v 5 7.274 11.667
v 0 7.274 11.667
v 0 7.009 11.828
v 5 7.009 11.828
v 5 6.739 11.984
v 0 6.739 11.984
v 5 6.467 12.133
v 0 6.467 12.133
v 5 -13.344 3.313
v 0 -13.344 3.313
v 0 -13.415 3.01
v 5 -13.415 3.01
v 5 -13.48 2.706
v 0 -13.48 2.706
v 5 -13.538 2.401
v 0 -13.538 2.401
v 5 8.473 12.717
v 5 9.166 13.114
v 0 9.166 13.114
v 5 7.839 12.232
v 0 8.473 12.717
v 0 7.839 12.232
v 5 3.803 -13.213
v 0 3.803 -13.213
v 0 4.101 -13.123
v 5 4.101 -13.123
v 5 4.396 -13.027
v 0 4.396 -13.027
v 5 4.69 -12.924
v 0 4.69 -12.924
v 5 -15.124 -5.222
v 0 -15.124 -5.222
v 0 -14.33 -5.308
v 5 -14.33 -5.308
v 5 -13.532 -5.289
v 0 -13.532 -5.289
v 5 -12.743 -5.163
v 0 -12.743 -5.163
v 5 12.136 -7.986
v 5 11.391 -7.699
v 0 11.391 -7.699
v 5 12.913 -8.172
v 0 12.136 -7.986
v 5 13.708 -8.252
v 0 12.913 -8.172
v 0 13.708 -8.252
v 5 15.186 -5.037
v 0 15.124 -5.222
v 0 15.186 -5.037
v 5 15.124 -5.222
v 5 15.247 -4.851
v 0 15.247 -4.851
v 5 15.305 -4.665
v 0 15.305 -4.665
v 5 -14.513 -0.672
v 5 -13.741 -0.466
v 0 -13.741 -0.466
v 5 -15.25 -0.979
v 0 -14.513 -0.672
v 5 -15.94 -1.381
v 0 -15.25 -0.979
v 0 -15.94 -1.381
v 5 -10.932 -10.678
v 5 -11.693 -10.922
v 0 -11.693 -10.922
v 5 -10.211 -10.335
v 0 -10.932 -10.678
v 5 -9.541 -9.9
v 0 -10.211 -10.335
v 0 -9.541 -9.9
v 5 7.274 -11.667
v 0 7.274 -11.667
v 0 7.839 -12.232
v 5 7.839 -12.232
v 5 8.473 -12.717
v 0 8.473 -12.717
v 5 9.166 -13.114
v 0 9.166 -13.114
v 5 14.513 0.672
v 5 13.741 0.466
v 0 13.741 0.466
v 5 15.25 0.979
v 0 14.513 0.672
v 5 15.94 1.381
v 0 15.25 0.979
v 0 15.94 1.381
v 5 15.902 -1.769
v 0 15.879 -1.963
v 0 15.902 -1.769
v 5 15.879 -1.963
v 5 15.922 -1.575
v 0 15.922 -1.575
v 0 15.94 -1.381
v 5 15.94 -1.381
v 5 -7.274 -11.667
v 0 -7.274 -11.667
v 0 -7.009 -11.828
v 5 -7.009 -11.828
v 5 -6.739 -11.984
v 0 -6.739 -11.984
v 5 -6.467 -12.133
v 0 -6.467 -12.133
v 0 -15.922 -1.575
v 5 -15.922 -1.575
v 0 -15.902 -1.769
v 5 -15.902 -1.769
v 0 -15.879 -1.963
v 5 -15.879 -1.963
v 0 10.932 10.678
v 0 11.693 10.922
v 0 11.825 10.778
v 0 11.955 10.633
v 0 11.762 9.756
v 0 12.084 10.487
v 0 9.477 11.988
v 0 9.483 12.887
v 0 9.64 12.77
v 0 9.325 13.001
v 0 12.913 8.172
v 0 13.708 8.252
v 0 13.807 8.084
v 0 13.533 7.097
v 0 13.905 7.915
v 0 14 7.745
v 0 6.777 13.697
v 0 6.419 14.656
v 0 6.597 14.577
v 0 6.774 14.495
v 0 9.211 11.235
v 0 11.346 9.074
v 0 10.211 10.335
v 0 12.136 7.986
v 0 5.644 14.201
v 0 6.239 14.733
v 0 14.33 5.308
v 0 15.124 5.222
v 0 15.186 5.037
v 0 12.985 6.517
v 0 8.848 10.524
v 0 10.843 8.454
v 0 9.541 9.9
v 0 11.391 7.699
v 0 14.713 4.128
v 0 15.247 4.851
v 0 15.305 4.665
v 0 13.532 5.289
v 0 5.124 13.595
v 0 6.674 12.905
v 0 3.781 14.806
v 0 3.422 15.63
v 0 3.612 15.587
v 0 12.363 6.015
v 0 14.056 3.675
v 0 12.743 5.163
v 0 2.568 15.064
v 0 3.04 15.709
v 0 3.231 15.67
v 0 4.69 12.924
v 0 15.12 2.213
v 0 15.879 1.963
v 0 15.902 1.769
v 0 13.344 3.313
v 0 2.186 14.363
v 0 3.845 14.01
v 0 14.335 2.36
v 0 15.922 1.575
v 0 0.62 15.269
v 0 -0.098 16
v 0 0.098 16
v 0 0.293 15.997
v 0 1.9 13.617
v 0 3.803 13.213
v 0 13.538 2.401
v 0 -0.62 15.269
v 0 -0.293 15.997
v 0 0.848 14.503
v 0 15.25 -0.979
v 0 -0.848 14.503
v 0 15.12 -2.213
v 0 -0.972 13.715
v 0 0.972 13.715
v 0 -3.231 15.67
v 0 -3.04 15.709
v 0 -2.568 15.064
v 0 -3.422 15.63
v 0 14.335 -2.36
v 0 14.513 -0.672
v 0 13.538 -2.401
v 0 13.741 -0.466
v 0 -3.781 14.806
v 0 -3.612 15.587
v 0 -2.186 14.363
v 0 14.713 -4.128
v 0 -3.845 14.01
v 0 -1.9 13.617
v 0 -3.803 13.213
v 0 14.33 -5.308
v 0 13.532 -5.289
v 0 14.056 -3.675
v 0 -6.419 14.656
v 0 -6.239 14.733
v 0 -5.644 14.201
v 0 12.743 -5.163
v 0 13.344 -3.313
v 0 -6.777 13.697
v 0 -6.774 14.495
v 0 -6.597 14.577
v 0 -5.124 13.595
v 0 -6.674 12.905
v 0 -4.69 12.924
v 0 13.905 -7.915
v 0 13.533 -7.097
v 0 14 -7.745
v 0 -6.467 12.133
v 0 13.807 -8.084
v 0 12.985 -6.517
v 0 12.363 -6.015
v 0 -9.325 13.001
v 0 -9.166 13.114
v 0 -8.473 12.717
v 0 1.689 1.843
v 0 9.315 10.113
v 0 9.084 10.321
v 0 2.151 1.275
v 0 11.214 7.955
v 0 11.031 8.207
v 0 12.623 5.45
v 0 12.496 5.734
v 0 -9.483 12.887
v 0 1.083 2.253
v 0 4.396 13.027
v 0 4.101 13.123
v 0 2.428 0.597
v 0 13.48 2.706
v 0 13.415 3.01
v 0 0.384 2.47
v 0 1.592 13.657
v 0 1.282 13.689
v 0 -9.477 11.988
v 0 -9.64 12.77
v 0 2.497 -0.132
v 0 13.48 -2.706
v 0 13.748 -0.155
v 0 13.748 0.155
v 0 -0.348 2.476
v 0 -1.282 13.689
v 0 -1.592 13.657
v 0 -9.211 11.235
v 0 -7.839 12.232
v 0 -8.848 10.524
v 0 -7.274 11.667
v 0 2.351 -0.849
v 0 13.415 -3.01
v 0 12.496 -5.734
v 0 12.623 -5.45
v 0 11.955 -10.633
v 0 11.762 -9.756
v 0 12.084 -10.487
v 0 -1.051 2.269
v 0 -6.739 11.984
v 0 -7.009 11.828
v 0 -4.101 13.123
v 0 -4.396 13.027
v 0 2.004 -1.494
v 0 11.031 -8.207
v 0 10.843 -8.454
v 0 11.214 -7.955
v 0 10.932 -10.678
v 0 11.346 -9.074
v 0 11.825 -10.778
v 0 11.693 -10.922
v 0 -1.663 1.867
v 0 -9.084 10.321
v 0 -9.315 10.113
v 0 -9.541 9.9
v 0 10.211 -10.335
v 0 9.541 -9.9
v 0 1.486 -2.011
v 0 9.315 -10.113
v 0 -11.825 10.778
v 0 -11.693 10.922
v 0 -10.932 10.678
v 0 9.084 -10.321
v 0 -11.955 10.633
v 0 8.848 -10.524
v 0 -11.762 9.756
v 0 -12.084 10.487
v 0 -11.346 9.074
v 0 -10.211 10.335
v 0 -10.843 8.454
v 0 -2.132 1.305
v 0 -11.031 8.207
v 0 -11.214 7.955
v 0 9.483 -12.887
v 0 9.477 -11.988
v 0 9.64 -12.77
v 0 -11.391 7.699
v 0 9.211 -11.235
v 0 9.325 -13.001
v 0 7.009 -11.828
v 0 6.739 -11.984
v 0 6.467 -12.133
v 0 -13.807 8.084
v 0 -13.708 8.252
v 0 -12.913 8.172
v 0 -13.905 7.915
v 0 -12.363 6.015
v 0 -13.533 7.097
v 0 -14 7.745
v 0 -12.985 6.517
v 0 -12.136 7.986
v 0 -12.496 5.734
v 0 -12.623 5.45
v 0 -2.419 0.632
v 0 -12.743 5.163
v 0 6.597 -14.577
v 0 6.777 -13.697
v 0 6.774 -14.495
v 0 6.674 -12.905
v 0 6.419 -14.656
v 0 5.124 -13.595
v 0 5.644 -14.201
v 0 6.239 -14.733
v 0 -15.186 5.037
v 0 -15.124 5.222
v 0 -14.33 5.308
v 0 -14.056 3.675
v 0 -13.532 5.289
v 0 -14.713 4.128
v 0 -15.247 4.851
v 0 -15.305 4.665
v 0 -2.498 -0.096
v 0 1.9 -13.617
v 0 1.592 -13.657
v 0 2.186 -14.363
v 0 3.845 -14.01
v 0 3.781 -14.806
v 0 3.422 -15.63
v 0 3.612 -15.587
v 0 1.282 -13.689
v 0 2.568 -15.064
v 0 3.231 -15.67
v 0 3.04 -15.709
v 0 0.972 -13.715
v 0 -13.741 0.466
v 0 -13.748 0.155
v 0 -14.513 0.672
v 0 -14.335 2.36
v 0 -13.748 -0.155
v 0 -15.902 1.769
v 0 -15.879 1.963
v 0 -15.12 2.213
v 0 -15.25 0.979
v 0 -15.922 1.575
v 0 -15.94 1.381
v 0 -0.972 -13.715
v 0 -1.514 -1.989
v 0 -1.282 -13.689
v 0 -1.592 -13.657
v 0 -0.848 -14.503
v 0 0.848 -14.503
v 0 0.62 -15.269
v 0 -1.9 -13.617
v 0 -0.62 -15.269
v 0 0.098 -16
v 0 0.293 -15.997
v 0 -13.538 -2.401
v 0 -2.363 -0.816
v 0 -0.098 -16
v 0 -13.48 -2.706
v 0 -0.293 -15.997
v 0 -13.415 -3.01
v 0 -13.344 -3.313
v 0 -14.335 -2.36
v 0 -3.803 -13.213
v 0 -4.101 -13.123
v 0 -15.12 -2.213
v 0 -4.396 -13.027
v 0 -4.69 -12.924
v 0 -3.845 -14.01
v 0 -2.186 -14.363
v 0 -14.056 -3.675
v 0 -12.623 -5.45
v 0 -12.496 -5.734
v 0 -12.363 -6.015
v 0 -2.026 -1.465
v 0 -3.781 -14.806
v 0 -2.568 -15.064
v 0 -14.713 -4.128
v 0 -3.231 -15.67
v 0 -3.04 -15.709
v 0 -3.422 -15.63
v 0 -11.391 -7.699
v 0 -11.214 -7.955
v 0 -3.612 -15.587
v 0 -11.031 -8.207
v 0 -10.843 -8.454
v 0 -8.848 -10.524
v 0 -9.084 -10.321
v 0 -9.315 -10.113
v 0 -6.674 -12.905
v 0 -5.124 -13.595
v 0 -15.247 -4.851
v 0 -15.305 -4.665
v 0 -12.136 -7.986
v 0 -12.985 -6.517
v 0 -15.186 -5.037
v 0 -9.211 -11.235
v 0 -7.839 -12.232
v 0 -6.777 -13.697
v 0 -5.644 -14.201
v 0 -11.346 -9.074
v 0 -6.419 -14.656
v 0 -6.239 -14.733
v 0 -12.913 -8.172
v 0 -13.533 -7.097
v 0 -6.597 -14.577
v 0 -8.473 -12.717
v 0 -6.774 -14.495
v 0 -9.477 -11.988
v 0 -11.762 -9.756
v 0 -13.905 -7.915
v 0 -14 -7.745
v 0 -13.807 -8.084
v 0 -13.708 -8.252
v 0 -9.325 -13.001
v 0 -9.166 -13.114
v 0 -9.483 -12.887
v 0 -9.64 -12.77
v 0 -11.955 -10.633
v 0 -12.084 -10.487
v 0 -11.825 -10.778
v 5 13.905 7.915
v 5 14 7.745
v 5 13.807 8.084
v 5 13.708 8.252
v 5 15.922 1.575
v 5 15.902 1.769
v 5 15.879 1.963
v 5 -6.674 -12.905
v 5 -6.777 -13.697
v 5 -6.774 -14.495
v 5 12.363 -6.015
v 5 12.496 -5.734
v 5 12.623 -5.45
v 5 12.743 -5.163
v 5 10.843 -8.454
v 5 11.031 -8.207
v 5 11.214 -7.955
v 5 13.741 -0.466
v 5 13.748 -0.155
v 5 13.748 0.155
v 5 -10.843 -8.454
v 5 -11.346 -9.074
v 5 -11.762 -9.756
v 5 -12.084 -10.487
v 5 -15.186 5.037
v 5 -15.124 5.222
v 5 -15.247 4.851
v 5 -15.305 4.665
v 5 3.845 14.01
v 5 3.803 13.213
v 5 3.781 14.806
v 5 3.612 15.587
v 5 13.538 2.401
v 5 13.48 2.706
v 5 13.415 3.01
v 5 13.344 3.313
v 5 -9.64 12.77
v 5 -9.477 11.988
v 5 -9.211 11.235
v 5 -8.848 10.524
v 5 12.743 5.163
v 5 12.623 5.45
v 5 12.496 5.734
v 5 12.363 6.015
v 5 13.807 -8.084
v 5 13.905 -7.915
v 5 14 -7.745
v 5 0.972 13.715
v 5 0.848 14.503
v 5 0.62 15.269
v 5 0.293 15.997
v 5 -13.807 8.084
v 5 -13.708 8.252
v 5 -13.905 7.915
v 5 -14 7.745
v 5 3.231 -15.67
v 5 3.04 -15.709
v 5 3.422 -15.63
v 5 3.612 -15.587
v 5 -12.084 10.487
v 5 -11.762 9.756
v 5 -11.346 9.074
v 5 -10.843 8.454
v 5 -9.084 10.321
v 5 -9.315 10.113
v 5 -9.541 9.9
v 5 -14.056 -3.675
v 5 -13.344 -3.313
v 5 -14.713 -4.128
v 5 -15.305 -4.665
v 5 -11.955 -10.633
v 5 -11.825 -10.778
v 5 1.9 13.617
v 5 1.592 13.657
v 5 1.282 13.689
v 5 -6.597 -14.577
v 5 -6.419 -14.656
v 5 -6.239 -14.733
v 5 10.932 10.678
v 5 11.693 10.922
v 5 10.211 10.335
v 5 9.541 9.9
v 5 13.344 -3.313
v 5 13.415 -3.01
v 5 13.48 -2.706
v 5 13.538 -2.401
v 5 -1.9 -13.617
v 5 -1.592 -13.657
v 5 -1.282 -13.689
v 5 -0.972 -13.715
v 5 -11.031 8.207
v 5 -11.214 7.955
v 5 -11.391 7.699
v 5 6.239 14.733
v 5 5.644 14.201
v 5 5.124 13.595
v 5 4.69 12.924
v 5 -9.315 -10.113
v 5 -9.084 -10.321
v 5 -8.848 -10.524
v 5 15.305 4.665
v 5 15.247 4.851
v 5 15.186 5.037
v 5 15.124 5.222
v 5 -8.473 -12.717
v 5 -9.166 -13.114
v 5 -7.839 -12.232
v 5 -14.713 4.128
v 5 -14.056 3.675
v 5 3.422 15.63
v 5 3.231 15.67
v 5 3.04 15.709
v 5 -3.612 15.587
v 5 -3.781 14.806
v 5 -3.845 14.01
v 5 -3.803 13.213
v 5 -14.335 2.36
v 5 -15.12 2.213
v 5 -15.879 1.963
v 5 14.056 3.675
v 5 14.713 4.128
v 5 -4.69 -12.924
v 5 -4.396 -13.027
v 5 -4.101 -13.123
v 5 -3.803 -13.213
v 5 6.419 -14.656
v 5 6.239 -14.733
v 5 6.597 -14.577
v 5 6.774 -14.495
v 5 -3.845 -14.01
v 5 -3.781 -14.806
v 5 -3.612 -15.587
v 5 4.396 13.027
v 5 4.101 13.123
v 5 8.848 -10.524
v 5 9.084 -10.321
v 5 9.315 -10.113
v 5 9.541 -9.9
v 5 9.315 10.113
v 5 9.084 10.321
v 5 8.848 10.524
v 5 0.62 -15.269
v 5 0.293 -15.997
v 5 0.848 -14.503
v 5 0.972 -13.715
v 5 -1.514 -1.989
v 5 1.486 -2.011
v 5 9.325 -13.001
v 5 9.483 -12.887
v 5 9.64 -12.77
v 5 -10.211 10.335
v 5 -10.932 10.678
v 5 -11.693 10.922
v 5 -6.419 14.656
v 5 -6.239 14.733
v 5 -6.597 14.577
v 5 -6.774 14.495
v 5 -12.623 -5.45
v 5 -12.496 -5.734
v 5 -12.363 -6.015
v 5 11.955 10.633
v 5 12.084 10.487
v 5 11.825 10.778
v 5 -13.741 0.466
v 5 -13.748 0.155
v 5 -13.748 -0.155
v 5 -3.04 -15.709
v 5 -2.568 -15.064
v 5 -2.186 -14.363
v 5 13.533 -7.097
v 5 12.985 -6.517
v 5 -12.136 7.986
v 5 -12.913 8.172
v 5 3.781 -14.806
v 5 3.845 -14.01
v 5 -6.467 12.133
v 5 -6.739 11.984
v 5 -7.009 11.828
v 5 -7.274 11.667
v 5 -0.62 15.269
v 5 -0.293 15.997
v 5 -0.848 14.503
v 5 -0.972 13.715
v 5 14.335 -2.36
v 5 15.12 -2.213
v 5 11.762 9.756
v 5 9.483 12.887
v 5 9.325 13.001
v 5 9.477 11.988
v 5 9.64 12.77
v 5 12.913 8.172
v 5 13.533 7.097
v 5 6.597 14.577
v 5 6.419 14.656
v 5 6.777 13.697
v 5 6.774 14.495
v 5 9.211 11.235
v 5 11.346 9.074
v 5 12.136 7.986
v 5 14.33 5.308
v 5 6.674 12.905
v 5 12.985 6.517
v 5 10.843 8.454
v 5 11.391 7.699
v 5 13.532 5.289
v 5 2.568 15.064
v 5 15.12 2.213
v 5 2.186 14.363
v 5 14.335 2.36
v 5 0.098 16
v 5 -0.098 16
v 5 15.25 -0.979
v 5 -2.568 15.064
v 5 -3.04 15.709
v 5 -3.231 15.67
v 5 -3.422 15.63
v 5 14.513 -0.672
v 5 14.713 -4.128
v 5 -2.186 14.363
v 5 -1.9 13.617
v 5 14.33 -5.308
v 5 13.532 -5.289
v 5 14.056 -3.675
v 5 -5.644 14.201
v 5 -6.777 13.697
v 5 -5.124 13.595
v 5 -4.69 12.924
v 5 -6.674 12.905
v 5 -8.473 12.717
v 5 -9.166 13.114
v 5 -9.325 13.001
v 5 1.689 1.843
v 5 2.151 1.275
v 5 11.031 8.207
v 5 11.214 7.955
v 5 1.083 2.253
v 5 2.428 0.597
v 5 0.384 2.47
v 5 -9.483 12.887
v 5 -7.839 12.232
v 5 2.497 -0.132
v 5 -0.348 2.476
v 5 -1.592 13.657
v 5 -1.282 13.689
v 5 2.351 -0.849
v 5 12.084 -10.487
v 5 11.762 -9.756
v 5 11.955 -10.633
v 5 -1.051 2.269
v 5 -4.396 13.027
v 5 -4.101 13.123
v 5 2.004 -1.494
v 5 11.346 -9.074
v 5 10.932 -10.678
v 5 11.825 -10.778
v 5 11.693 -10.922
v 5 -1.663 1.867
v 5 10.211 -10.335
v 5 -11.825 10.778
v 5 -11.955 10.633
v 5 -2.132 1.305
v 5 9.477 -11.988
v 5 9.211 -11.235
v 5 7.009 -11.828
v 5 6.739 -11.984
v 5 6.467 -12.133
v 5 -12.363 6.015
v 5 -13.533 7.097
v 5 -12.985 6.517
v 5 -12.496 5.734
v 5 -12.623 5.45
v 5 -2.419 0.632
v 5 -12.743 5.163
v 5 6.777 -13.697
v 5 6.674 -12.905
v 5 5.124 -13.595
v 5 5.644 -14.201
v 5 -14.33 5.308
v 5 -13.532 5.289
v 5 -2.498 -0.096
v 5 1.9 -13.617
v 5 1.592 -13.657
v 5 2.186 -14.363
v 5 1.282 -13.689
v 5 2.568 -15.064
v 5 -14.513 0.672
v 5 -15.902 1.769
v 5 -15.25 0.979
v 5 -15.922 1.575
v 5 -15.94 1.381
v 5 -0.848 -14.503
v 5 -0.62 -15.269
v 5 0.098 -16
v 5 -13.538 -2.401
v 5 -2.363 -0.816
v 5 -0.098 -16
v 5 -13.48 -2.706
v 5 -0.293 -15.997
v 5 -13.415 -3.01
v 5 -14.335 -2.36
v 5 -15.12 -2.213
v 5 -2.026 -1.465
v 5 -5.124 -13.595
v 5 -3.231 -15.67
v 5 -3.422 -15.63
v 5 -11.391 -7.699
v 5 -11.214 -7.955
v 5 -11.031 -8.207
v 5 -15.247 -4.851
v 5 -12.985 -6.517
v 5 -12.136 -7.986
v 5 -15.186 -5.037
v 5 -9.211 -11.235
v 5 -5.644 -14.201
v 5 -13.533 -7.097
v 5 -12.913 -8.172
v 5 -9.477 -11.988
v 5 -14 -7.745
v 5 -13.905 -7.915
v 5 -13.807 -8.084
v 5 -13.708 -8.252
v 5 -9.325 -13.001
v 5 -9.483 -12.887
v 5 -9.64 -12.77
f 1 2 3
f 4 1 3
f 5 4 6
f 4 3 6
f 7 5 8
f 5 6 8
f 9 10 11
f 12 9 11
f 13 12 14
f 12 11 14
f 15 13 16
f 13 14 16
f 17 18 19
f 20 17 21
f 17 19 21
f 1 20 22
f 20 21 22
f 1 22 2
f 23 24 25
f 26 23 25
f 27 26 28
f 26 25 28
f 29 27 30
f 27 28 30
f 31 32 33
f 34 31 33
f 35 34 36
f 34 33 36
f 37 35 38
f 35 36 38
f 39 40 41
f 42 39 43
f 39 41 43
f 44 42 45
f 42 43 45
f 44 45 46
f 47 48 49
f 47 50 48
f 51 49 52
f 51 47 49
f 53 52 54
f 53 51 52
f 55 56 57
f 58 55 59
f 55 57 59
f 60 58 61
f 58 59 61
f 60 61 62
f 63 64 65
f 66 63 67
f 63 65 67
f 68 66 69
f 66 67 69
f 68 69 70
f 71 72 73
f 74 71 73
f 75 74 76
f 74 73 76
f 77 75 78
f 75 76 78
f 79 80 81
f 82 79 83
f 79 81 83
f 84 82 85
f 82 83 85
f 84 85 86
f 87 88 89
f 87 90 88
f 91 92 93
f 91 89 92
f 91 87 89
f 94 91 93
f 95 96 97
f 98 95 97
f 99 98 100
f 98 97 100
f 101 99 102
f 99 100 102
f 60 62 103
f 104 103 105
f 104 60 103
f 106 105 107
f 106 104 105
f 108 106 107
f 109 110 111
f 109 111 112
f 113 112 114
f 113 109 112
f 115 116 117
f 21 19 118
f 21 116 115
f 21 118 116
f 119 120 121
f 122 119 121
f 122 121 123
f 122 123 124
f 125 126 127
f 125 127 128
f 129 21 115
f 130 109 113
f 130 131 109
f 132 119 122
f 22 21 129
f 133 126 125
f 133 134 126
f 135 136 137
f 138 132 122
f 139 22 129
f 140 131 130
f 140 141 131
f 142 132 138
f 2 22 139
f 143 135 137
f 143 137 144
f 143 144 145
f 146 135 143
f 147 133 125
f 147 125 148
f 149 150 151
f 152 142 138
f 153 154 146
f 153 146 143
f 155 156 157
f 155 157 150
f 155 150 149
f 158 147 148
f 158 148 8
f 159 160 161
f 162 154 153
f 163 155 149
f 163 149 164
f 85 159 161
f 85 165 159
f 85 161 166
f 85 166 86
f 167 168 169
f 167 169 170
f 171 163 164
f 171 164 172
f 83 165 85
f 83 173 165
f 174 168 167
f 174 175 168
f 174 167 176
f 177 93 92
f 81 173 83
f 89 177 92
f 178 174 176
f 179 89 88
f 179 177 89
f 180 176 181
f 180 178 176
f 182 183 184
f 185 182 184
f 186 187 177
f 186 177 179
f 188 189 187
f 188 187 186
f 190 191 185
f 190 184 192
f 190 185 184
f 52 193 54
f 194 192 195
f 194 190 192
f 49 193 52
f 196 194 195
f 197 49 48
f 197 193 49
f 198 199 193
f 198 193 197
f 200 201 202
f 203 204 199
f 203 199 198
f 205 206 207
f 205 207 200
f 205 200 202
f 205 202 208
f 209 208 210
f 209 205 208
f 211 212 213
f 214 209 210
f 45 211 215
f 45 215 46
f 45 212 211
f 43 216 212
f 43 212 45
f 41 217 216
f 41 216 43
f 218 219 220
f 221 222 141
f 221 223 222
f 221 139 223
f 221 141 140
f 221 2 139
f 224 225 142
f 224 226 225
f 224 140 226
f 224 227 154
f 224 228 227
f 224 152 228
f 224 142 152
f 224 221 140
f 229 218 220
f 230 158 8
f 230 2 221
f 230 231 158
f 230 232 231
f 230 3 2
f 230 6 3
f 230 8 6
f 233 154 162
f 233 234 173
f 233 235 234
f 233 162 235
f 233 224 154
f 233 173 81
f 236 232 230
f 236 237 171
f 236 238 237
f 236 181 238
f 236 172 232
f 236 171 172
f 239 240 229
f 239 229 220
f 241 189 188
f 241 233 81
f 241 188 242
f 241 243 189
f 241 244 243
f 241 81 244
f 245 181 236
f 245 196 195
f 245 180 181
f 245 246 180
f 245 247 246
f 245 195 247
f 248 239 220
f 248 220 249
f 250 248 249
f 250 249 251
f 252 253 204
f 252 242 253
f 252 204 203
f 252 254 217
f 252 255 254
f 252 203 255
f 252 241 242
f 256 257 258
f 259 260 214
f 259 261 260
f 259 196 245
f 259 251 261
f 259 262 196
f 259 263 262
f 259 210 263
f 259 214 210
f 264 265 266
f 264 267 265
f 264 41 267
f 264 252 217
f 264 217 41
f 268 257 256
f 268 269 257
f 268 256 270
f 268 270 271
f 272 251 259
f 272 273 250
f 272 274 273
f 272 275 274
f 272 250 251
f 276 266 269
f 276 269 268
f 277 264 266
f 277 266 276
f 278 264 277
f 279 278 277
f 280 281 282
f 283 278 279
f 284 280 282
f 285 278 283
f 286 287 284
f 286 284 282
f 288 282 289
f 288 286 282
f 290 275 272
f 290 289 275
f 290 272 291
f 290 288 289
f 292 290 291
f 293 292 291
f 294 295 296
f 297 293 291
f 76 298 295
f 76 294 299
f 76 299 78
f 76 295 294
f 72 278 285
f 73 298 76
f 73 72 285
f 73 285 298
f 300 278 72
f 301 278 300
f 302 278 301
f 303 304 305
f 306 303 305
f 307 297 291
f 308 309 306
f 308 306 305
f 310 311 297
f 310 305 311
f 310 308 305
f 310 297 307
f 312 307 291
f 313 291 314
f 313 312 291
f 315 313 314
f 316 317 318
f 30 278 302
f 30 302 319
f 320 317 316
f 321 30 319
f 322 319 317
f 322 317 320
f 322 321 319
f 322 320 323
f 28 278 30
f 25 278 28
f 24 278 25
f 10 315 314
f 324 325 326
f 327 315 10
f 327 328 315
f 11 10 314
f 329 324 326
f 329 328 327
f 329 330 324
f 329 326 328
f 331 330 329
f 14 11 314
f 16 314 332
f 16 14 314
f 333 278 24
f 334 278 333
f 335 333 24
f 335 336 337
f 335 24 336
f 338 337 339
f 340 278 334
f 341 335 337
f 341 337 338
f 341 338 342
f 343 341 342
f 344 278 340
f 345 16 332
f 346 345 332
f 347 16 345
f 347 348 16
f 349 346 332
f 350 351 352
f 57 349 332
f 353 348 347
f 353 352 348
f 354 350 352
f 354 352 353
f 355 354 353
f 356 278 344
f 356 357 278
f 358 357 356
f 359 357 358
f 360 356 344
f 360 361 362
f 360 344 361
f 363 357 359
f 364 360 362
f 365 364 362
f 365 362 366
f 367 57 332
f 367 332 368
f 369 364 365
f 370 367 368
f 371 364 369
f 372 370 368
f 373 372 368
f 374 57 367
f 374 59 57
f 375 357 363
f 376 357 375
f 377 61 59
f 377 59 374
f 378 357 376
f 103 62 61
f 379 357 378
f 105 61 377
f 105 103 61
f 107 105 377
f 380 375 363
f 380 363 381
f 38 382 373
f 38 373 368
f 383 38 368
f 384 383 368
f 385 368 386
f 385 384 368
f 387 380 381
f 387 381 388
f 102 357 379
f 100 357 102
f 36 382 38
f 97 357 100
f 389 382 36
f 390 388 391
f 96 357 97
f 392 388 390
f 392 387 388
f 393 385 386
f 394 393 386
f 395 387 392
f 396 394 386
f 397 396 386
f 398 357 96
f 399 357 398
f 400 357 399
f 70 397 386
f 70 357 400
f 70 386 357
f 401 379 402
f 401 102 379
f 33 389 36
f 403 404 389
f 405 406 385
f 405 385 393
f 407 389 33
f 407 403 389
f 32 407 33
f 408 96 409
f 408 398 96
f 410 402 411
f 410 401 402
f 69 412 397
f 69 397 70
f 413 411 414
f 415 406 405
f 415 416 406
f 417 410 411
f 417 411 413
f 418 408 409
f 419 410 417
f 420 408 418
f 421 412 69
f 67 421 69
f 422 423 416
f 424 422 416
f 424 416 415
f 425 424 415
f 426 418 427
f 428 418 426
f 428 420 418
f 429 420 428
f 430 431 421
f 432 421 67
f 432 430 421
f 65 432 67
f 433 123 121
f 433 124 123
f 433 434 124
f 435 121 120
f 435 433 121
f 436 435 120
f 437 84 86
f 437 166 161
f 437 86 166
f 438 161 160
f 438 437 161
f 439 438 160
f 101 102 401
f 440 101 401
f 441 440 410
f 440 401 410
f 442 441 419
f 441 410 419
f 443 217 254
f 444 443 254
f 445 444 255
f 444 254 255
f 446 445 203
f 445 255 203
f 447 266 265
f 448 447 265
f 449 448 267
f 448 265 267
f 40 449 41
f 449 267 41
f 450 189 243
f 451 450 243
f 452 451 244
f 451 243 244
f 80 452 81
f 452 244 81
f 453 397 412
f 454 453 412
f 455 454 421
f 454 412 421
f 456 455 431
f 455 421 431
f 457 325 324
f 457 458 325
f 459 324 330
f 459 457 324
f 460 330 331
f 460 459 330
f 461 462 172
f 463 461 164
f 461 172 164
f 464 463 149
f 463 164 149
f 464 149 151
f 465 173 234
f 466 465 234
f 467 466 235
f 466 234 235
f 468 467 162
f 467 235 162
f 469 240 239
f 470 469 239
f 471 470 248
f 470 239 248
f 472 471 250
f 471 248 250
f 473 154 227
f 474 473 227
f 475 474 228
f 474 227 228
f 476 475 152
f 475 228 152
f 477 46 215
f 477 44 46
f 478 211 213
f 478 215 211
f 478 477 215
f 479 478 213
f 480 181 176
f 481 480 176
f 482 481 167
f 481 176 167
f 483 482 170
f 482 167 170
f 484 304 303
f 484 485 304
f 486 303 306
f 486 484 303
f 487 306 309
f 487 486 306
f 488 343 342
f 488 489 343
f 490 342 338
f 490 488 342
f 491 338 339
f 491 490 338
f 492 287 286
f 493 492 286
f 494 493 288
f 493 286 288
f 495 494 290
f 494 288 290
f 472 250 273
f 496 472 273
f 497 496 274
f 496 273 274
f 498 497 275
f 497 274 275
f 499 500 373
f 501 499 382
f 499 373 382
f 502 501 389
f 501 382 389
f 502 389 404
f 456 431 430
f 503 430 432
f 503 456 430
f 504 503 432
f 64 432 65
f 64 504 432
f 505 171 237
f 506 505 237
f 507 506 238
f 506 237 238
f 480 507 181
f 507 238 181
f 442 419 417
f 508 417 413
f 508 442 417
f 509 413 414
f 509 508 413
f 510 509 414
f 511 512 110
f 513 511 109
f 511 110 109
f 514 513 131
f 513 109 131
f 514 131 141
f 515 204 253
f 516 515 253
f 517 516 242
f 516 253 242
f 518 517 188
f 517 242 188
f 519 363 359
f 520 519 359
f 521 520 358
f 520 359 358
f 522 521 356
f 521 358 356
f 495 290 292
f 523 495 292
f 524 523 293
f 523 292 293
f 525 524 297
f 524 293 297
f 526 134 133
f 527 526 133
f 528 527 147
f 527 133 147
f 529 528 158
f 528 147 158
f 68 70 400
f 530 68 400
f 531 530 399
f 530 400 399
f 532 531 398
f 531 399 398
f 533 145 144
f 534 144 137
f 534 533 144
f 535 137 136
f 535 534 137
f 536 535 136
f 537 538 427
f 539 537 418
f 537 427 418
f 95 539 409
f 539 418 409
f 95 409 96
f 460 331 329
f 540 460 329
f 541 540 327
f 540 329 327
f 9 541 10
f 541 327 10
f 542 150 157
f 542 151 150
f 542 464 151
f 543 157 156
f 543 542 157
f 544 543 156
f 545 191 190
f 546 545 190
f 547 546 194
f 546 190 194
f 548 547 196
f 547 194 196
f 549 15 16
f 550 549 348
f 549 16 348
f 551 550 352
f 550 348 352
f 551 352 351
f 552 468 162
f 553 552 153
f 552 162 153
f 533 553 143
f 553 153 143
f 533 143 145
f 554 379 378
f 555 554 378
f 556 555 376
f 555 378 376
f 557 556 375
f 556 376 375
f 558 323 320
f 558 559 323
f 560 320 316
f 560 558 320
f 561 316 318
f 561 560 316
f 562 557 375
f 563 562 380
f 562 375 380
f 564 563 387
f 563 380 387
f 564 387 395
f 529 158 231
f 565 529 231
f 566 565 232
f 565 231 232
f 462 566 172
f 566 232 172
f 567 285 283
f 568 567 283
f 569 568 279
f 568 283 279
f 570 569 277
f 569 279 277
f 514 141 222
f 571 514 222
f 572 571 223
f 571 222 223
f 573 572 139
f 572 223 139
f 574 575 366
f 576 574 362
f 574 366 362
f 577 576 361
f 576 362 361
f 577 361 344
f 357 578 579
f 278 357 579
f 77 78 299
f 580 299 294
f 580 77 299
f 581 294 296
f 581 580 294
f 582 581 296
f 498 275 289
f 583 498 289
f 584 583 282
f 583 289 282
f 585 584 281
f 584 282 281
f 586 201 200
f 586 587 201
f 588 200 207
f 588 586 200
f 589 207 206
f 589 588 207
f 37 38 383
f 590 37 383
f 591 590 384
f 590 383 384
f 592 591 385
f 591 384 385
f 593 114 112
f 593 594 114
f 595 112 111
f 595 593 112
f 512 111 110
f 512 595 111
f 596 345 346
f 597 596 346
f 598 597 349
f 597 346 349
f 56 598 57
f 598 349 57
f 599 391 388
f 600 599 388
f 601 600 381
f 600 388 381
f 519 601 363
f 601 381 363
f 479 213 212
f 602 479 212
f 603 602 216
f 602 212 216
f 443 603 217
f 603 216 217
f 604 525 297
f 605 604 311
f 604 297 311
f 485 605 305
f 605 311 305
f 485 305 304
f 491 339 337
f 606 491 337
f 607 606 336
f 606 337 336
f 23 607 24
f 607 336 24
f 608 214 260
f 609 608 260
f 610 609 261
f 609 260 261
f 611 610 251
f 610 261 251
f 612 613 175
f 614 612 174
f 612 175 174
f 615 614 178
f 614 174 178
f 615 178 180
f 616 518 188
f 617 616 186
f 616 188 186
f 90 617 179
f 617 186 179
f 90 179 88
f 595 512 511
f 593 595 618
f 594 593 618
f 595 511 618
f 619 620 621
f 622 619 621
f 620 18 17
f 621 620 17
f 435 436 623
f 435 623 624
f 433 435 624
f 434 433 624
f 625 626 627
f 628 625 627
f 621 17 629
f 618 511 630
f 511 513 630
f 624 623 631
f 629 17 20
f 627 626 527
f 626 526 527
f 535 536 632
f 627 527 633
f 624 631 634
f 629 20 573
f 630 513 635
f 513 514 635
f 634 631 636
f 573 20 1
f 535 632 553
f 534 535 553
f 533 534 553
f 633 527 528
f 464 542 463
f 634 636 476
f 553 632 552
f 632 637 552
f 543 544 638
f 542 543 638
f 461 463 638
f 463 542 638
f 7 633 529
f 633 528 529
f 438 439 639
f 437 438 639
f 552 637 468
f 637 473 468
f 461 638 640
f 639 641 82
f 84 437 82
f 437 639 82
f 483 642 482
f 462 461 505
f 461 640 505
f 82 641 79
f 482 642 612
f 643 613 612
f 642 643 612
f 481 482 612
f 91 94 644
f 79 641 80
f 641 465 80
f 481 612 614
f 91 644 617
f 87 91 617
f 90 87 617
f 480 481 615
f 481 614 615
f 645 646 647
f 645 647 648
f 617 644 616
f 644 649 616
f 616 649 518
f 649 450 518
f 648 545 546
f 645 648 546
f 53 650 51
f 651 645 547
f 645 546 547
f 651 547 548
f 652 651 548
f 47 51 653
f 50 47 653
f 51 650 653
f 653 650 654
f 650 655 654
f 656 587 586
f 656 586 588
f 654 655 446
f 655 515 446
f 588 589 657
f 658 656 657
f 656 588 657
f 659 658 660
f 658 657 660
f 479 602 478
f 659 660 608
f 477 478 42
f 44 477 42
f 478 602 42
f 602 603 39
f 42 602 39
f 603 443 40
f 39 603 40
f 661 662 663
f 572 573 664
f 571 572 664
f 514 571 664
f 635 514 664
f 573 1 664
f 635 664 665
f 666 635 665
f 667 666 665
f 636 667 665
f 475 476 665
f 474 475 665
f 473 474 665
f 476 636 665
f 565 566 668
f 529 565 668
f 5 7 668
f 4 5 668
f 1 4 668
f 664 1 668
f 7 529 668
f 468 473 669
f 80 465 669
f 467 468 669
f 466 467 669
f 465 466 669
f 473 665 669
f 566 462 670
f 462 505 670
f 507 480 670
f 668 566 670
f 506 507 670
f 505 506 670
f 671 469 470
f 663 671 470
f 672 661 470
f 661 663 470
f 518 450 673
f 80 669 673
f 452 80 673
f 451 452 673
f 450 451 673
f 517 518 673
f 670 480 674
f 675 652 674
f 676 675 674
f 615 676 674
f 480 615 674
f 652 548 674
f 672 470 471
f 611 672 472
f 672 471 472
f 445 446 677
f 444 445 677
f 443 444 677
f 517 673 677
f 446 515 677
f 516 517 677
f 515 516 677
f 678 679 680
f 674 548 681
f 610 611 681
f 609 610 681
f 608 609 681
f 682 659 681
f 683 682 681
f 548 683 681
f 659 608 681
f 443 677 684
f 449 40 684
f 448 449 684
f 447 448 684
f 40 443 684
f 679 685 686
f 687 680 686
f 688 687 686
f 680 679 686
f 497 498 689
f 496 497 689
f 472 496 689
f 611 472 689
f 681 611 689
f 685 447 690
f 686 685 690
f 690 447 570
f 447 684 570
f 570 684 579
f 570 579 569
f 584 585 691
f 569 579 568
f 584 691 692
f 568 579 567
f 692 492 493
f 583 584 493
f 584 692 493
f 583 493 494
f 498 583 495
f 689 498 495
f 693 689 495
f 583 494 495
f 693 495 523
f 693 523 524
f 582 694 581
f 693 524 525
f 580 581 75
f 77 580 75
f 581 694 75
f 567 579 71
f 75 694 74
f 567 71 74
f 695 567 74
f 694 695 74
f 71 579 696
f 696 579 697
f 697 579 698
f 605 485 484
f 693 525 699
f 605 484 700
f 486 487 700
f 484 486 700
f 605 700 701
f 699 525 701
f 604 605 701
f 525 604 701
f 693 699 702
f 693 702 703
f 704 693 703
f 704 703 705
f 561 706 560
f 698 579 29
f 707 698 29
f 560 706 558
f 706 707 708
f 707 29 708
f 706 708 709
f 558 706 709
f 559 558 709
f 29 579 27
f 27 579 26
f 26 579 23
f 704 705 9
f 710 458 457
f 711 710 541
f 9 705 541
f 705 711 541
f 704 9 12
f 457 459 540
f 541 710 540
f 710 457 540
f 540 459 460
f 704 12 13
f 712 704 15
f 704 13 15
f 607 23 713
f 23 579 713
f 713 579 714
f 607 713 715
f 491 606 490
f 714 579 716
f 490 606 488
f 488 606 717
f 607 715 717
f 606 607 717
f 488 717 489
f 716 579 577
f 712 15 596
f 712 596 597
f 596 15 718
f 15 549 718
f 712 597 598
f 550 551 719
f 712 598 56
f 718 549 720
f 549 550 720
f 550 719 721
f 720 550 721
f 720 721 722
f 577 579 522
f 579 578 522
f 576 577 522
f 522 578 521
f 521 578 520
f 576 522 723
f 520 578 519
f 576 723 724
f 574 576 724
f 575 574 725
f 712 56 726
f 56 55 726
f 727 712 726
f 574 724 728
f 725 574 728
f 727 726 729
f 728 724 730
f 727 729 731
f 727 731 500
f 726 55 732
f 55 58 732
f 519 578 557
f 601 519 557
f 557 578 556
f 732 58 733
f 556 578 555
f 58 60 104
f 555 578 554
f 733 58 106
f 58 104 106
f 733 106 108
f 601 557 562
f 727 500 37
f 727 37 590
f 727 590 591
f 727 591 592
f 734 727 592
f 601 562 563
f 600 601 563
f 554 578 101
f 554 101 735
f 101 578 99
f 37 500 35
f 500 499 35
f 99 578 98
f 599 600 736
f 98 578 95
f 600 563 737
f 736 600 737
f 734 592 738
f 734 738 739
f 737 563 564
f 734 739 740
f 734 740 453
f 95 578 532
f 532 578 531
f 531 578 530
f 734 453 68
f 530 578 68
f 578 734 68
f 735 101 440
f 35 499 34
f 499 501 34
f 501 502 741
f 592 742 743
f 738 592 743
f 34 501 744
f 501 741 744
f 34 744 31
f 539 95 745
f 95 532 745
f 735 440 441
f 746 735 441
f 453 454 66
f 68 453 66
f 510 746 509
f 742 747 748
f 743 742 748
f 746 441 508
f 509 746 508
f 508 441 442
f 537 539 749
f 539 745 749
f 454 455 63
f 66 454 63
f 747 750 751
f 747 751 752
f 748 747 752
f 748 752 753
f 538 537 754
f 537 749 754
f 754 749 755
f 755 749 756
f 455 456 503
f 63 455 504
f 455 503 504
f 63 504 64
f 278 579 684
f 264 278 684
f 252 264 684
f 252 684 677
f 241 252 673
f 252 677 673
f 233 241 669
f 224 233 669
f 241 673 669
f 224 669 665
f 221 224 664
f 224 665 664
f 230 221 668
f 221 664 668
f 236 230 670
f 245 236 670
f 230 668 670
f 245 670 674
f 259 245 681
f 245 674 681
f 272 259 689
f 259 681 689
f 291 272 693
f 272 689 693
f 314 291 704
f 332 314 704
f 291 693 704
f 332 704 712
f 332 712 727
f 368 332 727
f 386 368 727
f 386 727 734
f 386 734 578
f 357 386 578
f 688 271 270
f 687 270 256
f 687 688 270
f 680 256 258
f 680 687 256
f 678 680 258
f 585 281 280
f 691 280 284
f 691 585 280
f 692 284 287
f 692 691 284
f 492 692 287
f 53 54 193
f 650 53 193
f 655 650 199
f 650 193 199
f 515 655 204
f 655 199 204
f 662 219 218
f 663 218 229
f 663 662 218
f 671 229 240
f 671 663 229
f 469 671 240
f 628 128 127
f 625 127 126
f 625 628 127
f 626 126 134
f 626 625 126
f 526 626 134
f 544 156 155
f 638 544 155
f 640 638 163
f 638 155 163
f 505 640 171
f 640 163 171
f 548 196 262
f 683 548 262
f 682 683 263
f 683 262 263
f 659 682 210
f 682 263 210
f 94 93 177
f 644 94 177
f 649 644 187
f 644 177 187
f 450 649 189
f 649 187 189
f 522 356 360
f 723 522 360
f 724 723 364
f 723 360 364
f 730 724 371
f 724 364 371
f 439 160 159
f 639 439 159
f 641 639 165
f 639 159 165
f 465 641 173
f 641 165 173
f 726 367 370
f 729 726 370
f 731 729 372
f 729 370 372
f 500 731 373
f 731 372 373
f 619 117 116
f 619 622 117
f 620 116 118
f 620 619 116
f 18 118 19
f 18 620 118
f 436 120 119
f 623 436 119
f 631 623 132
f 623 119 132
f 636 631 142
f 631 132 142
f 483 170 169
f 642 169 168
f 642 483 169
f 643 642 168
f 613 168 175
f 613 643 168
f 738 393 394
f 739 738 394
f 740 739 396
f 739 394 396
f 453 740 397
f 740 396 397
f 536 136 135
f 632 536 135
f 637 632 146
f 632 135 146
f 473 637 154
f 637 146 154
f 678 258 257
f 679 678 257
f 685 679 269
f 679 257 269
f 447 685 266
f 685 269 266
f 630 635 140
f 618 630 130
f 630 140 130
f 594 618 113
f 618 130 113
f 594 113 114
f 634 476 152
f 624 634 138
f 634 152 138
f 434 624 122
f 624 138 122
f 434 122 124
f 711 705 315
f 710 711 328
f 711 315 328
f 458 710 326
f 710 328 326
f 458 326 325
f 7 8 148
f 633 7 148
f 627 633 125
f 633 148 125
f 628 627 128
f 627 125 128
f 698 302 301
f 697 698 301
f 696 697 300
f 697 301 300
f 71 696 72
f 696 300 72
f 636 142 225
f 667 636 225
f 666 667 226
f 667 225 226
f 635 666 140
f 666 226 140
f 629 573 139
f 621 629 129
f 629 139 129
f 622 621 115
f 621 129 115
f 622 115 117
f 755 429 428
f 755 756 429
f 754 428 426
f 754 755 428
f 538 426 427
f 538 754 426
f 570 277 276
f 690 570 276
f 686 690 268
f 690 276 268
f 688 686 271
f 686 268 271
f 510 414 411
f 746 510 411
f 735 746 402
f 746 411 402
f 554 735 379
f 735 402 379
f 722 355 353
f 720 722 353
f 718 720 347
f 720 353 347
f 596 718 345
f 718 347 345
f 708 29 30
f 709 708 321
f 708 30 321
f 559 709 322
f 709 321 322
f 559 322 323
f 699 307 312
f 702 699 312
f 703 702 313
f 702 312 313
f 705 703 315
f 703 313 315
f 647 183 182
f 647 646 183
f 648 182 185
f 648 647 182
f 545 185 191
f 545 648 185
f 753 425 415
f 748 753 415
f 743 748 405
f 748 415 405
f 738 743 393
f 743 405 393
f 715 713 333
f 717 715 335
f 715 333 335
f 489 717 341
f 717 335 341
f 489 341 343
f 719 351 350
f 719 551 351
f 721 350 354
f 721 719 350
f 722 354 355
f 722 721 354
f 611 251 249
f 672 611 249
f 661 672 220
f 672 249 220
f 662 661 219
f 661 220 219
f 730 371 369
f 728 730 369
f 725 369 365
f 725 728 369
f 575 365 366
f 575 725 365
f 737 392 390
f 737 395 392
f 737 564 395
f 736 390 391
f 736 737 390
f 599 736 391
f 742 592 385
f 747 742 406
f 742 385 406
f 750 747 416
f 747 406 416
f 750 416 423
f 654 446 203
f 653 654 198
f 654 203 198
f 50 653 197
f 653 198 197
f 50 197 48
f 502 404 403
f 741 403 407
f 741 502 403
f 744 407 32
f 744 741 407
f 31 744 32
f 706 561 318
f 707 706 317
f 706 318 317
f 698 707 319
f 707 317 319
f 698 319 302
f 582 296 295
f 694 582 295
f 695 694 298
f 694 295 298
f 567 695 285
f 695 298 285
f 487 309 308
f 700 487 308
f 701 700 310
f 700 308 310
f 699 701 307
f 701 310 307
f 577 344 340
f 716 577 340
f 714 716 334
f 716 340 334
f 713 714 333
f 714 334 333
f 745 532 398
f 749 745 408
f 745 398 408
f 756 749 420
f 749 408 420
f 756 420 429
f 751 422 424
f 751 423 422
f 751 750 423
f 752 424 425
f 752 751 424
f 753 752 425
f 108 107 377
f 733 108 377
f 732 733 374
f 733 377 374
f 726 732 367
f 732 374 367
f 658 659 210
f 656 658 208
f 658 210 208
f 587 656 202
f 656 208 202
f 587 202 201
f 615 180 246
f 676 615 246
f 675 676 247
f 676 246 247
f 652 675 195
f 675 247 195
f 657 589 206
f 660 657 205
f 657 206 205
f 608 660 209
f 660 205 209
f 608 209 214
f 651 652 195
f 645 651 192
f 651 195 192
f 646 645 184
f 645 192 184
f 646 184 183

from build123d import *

# Parameters (mm, degrees)
BASPROSKE_W        = 5
BASPROSKE_H        = 16
TOOTHCUT_DEPTH     = 24.173260453
TEETHCUTS_COUNT    = 30
TEETHCUTS_ANGLE    = 348
BORSKE_R           = 2.5
BORE_DEPTH         = 50.0000508
ESQUISSE1_R        = 3.356867485
BOSS_EXTRU_1_DEPTH = 5


with BuildPart() as part:
    # BasProSke → Base-Revolve (revolve)
    with BuildSketch(Plane(origin=(0, 0, 0), x_dir=(1, 0, 0), z_dir=(0, 1, 0)), mode=Mode.PRIVATE) as base_revolve_sk:
        with Locations((2.5, 8)):
            Rectangle(BASPROSKE_W, BASPROSKE_H)
    revolve(base_revolve_sk.sketch.rotate(Axis((-10, 0, 0), (1, 0, 0)), 180), axis=Axis((-10, 0, 0), (1, 0, 0)))

    # TooCutSke → ToothCut (cut, through all)
    with BuildSketch(Plane(origin=(0, 0, 0), x_dir=(0, 0, -1), z_dir=(1, 0, 0))):
        with BuildLine():
            ThreePointArc((0.466400716, 13.741086979), (0, 13.749), (-0.466400716, 13.741086979))
            ThreePointArc((-0.466400716, 13.741086979), (-0.819142092, 14.899954875), (-1.3974676, 15.964351834))
            ThreePointArc((-1.3974676, 15.964351834), (0, 16.0254), (1.3974676, 15.964351834))
            ThreePointArc((1.3974676, 15.964351834), (0.819142092, 14.899954875), (0.466400716, 13.741086979))
        make_face()
    toothcut = extrude(amount=TOOTHCUT_DEPTH, mode=Mode.SUBTRACT)

    # TeethCuts: ToothCut ×30 about axis
    teethcuts_axis = Axis((-10, 0, 0), (1, 0, 0))
    for i in range(1, TEETHCUTS_COUNT):
        add(toothcut.rotate(teethcuts_axis, i * TEETHCUTS_ANGLE / (TEETHCUTS_COUNT - 1)), mode=Mode.SUBTRACT)

    # BorSke → Bore (cut, symmetric)
    with BuildSketch(Plane(origin=(0, 0, 0), x_dir=(0, 0, -1), z_dir=(1, 0, 0))):
        with Locations(Location((0, 0, 0), (0, 0, 180))):
            Circle(BORSKE_R)
    extrude(amount=BORE_DEPTH, both=True, mode=Mode.SUBTRACT)

    # Esquisse1 → Boss.-Extru.1 (add)
    with BuildSketch(Plane(origin=(5, 0, 0), x_dir=(0, 0, -1), z_dir=(1, 0, 0))):
        Circle(ESQUISSE1_R)
        with BuildLine():
            Line((1.989182734, -1.514315704), (2.010613168, 1.485743817))
            ThreePointArc((2.010613168, 1.485743817), (-2.499936218, 0.017857885), (1.989182734, -1.514315704))
        make_face(mode=Mode.SUBTRACT)
    extrude(amount=-BOSS_EXTRU_1_DEPTH)


solid = part.part
